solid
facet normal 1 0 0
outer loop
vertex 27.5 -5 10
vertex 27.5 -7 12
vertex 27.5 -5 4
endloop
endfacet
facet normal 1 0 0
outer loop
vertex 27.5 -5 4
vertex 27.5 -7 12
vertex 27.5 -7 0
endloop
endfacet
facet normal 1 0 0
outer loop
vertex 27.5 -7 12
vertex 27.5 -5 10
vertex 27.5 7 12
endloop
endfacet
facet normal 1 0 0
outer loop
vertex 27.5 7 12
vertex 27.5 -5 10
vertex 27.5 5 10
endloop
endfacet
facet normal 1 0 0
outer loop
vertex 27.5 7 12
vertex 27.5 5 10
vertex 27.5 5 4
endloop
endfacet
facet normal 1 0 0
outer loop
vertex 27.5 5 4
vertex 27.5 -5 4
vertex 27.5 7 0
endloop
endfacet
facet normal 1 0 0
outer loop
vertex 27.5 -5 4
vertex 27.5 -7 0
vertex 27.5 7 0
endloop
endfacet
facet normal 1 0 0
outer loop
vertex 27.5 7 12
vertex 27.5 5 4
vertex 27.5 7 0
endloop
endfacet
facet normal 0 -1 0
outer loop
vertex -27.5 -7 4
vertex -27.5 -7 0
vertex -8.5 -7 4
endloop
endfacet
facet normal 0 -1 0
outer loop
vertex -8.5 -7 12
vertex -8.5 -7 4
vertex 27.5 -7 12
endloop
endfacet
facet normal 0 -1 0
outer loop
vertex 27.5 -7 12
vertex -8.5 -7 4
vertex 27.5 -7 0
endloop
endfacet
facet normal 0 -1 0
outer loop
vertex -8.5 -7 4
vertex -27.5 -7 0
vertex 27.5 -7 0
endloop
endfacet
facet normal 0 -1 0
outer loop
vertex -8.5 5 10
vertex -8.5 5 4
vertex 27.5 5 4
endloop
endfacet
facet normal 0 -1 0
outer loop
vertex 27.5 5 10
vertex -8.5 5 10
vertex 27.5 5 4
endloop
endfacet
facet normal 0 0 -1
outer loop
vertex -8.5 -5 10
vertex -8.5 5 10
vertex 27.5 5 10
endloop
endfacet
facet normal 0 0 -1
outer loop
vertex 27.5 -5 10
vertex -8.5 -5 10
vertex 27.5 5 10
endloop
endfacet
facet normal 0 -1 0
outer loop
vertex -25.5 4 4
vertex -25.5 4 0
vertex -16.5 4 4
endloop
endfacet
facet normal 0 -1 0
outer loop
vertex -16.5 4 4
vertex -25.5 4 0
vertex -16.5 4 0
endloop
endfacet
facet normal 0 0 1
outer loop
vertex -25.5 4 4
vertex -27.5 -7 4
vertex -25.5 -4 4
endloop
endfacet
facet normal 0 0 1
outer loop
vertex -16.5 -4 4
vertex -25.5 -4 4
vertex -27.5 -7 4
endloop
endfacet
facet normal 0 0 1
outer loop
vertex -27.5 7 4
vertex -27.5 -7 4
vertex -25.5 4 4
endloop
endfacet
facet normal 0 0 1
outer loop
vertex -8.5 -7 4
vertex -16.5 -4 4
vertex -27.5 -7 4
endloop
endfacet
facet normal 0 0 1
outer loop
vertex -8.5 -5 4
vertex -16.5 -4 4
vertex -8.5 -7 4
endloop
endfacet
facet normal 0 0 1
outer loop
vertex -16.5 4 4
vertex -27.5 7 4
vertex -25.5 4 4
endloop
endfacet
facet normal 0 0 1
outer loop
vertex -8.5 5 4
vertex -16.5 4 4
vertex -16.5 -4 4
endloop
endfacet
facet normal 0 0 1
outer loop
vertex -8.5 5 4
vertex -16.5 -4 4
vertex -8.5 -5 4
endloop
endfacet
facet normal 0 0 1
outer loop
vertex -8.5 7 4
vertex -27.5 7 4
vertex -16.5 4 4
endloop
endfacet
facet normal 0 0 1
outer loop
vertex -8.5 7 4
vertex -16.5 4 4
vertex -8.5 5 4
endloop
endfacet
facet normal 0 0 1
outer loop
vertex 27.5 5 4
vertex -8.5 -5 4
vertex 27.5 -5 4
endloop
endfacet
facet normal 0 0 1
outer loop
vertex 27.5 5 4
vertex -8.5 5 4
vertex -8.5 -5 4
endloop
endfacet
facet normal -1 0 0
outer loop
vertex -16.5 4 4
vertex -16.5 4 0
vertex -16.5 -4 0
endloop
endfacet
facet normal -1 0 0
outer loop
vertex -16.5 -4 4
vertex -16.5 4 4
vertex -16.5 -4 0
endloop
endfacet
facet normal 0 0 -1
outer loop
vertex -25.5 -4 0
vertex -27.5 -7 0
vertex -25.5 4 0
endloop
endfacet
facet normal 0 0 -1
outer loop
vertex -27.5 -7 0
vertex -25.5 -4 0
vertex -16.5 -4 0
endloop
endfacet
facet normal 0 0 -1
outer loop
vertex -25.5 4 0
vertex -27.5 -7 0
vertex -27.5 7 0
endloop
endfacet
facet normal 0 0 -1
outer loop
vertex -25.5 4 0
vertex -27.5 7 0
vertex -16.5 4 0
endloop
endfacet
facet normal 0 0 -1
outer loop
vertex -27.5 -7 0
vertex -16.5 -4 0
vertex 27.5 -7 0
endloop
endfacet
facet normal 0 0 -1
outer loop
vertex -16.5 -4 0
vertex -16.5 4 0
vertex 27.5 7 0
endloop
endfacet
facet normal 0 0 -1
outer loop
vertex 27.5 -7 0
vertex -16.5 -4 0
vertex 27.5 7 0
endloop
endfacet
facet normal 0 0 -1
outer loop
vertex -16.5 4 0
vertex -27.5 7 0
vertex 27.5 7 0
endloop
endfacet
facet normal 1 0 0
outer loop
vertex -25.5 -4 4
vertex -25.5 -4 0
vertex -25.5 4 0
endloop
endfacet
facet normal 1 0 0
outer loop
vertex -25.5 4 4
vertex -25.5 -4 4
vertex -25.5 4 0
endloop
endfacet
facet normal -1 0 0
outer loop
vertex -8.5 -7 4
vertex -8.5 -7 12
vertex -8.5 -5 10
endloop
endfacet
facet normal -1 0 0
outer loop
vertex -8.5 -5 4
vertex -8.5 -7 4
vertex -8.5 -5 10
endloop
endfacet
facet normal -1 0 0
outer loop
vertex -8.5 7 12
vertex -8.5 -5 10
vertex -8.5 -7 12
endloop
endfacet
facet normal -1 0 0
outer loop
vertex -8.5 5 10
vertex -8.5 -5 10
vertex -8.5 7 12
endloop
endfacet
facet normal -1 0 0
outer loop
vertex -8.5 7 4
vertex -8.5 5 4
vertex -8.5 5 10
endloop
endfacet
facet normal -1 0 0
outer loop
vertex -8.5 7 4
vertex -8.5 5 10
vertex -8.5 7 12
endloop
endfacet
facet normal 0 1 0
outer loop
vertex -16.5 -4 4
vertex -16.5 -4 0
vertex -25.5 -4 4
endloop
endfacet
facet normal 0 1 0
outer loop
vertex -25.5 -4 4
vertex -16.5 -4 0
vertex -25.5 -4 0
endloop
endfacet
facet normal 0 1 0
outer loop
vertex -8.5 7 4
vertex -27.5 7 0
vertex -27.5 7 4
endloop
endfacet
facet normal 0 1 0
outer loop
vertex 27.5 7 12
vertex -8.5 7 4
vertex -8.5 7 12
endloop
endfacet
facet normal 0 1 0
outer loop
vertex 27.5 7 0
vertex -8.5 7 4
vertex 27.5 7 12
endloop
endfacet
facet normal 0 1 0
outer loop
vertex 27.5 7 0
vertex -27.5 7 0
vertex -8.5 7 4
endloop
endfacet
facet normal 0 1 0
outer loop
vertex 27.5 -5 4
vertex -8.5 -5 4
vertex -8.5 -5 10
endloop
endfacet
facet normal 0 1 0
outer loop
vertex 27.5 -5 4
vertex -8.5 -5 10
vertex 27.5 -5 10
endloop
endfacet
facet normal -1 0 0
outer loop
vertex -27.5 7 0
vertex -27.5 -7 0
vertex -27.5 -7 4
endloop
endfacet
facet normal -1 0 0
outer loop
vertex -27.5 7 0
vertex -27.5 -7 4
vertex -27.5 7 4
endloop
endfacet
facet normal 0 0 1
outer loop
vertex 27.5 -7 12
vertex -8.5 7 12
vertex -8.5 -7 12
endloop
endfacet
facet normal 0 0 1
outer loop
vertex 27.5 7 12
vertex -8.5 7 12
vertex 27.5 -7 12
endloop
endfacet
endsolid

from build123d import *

# Parameters (mm, degrees)
F0_W     = 55
F0_H     = 14
F1_DEPTH = 4
F2_W     = 36
F2_H     = 2
F3_DEPTH = 6
F4_W     = 36
F4_H     = 14
F5_DEPTH = 2


with BuildPart() as f1:
    # F0 (on Top) → F1 (new body)
    with BuildSketch(Plane.XY):
        Rectangle(F0_W, F0_H)
        Polygon((-25.5, -4), (-25.5, 4), (-16.5, 4), (-16.5, 0), (-16.5, -4), align=None, mode=Mode.SUBTRACT)
    extrude(amount=F1_DEPTH)

    # F2 (on face) → F3 (join)
    with BuildSketch(Plane.XY.offset(4)):
        with Locations((9.5, -6)):
            Rectangle(F2_W, F2_H)
        with Locations((9.5, 6)):
            Rectangle(F2_W, F2_H)
    extrude(amount=F3_DEPTH)

    # F4 (on face) → F5 (join)
    with BuildSketch(Plane.XY.offset(10)):
        with Locations((9.5, 0)):
            Rectangle(F4_W, F4_H)
    extrude(amount=F5_DEPTH)


solid = f1.part
